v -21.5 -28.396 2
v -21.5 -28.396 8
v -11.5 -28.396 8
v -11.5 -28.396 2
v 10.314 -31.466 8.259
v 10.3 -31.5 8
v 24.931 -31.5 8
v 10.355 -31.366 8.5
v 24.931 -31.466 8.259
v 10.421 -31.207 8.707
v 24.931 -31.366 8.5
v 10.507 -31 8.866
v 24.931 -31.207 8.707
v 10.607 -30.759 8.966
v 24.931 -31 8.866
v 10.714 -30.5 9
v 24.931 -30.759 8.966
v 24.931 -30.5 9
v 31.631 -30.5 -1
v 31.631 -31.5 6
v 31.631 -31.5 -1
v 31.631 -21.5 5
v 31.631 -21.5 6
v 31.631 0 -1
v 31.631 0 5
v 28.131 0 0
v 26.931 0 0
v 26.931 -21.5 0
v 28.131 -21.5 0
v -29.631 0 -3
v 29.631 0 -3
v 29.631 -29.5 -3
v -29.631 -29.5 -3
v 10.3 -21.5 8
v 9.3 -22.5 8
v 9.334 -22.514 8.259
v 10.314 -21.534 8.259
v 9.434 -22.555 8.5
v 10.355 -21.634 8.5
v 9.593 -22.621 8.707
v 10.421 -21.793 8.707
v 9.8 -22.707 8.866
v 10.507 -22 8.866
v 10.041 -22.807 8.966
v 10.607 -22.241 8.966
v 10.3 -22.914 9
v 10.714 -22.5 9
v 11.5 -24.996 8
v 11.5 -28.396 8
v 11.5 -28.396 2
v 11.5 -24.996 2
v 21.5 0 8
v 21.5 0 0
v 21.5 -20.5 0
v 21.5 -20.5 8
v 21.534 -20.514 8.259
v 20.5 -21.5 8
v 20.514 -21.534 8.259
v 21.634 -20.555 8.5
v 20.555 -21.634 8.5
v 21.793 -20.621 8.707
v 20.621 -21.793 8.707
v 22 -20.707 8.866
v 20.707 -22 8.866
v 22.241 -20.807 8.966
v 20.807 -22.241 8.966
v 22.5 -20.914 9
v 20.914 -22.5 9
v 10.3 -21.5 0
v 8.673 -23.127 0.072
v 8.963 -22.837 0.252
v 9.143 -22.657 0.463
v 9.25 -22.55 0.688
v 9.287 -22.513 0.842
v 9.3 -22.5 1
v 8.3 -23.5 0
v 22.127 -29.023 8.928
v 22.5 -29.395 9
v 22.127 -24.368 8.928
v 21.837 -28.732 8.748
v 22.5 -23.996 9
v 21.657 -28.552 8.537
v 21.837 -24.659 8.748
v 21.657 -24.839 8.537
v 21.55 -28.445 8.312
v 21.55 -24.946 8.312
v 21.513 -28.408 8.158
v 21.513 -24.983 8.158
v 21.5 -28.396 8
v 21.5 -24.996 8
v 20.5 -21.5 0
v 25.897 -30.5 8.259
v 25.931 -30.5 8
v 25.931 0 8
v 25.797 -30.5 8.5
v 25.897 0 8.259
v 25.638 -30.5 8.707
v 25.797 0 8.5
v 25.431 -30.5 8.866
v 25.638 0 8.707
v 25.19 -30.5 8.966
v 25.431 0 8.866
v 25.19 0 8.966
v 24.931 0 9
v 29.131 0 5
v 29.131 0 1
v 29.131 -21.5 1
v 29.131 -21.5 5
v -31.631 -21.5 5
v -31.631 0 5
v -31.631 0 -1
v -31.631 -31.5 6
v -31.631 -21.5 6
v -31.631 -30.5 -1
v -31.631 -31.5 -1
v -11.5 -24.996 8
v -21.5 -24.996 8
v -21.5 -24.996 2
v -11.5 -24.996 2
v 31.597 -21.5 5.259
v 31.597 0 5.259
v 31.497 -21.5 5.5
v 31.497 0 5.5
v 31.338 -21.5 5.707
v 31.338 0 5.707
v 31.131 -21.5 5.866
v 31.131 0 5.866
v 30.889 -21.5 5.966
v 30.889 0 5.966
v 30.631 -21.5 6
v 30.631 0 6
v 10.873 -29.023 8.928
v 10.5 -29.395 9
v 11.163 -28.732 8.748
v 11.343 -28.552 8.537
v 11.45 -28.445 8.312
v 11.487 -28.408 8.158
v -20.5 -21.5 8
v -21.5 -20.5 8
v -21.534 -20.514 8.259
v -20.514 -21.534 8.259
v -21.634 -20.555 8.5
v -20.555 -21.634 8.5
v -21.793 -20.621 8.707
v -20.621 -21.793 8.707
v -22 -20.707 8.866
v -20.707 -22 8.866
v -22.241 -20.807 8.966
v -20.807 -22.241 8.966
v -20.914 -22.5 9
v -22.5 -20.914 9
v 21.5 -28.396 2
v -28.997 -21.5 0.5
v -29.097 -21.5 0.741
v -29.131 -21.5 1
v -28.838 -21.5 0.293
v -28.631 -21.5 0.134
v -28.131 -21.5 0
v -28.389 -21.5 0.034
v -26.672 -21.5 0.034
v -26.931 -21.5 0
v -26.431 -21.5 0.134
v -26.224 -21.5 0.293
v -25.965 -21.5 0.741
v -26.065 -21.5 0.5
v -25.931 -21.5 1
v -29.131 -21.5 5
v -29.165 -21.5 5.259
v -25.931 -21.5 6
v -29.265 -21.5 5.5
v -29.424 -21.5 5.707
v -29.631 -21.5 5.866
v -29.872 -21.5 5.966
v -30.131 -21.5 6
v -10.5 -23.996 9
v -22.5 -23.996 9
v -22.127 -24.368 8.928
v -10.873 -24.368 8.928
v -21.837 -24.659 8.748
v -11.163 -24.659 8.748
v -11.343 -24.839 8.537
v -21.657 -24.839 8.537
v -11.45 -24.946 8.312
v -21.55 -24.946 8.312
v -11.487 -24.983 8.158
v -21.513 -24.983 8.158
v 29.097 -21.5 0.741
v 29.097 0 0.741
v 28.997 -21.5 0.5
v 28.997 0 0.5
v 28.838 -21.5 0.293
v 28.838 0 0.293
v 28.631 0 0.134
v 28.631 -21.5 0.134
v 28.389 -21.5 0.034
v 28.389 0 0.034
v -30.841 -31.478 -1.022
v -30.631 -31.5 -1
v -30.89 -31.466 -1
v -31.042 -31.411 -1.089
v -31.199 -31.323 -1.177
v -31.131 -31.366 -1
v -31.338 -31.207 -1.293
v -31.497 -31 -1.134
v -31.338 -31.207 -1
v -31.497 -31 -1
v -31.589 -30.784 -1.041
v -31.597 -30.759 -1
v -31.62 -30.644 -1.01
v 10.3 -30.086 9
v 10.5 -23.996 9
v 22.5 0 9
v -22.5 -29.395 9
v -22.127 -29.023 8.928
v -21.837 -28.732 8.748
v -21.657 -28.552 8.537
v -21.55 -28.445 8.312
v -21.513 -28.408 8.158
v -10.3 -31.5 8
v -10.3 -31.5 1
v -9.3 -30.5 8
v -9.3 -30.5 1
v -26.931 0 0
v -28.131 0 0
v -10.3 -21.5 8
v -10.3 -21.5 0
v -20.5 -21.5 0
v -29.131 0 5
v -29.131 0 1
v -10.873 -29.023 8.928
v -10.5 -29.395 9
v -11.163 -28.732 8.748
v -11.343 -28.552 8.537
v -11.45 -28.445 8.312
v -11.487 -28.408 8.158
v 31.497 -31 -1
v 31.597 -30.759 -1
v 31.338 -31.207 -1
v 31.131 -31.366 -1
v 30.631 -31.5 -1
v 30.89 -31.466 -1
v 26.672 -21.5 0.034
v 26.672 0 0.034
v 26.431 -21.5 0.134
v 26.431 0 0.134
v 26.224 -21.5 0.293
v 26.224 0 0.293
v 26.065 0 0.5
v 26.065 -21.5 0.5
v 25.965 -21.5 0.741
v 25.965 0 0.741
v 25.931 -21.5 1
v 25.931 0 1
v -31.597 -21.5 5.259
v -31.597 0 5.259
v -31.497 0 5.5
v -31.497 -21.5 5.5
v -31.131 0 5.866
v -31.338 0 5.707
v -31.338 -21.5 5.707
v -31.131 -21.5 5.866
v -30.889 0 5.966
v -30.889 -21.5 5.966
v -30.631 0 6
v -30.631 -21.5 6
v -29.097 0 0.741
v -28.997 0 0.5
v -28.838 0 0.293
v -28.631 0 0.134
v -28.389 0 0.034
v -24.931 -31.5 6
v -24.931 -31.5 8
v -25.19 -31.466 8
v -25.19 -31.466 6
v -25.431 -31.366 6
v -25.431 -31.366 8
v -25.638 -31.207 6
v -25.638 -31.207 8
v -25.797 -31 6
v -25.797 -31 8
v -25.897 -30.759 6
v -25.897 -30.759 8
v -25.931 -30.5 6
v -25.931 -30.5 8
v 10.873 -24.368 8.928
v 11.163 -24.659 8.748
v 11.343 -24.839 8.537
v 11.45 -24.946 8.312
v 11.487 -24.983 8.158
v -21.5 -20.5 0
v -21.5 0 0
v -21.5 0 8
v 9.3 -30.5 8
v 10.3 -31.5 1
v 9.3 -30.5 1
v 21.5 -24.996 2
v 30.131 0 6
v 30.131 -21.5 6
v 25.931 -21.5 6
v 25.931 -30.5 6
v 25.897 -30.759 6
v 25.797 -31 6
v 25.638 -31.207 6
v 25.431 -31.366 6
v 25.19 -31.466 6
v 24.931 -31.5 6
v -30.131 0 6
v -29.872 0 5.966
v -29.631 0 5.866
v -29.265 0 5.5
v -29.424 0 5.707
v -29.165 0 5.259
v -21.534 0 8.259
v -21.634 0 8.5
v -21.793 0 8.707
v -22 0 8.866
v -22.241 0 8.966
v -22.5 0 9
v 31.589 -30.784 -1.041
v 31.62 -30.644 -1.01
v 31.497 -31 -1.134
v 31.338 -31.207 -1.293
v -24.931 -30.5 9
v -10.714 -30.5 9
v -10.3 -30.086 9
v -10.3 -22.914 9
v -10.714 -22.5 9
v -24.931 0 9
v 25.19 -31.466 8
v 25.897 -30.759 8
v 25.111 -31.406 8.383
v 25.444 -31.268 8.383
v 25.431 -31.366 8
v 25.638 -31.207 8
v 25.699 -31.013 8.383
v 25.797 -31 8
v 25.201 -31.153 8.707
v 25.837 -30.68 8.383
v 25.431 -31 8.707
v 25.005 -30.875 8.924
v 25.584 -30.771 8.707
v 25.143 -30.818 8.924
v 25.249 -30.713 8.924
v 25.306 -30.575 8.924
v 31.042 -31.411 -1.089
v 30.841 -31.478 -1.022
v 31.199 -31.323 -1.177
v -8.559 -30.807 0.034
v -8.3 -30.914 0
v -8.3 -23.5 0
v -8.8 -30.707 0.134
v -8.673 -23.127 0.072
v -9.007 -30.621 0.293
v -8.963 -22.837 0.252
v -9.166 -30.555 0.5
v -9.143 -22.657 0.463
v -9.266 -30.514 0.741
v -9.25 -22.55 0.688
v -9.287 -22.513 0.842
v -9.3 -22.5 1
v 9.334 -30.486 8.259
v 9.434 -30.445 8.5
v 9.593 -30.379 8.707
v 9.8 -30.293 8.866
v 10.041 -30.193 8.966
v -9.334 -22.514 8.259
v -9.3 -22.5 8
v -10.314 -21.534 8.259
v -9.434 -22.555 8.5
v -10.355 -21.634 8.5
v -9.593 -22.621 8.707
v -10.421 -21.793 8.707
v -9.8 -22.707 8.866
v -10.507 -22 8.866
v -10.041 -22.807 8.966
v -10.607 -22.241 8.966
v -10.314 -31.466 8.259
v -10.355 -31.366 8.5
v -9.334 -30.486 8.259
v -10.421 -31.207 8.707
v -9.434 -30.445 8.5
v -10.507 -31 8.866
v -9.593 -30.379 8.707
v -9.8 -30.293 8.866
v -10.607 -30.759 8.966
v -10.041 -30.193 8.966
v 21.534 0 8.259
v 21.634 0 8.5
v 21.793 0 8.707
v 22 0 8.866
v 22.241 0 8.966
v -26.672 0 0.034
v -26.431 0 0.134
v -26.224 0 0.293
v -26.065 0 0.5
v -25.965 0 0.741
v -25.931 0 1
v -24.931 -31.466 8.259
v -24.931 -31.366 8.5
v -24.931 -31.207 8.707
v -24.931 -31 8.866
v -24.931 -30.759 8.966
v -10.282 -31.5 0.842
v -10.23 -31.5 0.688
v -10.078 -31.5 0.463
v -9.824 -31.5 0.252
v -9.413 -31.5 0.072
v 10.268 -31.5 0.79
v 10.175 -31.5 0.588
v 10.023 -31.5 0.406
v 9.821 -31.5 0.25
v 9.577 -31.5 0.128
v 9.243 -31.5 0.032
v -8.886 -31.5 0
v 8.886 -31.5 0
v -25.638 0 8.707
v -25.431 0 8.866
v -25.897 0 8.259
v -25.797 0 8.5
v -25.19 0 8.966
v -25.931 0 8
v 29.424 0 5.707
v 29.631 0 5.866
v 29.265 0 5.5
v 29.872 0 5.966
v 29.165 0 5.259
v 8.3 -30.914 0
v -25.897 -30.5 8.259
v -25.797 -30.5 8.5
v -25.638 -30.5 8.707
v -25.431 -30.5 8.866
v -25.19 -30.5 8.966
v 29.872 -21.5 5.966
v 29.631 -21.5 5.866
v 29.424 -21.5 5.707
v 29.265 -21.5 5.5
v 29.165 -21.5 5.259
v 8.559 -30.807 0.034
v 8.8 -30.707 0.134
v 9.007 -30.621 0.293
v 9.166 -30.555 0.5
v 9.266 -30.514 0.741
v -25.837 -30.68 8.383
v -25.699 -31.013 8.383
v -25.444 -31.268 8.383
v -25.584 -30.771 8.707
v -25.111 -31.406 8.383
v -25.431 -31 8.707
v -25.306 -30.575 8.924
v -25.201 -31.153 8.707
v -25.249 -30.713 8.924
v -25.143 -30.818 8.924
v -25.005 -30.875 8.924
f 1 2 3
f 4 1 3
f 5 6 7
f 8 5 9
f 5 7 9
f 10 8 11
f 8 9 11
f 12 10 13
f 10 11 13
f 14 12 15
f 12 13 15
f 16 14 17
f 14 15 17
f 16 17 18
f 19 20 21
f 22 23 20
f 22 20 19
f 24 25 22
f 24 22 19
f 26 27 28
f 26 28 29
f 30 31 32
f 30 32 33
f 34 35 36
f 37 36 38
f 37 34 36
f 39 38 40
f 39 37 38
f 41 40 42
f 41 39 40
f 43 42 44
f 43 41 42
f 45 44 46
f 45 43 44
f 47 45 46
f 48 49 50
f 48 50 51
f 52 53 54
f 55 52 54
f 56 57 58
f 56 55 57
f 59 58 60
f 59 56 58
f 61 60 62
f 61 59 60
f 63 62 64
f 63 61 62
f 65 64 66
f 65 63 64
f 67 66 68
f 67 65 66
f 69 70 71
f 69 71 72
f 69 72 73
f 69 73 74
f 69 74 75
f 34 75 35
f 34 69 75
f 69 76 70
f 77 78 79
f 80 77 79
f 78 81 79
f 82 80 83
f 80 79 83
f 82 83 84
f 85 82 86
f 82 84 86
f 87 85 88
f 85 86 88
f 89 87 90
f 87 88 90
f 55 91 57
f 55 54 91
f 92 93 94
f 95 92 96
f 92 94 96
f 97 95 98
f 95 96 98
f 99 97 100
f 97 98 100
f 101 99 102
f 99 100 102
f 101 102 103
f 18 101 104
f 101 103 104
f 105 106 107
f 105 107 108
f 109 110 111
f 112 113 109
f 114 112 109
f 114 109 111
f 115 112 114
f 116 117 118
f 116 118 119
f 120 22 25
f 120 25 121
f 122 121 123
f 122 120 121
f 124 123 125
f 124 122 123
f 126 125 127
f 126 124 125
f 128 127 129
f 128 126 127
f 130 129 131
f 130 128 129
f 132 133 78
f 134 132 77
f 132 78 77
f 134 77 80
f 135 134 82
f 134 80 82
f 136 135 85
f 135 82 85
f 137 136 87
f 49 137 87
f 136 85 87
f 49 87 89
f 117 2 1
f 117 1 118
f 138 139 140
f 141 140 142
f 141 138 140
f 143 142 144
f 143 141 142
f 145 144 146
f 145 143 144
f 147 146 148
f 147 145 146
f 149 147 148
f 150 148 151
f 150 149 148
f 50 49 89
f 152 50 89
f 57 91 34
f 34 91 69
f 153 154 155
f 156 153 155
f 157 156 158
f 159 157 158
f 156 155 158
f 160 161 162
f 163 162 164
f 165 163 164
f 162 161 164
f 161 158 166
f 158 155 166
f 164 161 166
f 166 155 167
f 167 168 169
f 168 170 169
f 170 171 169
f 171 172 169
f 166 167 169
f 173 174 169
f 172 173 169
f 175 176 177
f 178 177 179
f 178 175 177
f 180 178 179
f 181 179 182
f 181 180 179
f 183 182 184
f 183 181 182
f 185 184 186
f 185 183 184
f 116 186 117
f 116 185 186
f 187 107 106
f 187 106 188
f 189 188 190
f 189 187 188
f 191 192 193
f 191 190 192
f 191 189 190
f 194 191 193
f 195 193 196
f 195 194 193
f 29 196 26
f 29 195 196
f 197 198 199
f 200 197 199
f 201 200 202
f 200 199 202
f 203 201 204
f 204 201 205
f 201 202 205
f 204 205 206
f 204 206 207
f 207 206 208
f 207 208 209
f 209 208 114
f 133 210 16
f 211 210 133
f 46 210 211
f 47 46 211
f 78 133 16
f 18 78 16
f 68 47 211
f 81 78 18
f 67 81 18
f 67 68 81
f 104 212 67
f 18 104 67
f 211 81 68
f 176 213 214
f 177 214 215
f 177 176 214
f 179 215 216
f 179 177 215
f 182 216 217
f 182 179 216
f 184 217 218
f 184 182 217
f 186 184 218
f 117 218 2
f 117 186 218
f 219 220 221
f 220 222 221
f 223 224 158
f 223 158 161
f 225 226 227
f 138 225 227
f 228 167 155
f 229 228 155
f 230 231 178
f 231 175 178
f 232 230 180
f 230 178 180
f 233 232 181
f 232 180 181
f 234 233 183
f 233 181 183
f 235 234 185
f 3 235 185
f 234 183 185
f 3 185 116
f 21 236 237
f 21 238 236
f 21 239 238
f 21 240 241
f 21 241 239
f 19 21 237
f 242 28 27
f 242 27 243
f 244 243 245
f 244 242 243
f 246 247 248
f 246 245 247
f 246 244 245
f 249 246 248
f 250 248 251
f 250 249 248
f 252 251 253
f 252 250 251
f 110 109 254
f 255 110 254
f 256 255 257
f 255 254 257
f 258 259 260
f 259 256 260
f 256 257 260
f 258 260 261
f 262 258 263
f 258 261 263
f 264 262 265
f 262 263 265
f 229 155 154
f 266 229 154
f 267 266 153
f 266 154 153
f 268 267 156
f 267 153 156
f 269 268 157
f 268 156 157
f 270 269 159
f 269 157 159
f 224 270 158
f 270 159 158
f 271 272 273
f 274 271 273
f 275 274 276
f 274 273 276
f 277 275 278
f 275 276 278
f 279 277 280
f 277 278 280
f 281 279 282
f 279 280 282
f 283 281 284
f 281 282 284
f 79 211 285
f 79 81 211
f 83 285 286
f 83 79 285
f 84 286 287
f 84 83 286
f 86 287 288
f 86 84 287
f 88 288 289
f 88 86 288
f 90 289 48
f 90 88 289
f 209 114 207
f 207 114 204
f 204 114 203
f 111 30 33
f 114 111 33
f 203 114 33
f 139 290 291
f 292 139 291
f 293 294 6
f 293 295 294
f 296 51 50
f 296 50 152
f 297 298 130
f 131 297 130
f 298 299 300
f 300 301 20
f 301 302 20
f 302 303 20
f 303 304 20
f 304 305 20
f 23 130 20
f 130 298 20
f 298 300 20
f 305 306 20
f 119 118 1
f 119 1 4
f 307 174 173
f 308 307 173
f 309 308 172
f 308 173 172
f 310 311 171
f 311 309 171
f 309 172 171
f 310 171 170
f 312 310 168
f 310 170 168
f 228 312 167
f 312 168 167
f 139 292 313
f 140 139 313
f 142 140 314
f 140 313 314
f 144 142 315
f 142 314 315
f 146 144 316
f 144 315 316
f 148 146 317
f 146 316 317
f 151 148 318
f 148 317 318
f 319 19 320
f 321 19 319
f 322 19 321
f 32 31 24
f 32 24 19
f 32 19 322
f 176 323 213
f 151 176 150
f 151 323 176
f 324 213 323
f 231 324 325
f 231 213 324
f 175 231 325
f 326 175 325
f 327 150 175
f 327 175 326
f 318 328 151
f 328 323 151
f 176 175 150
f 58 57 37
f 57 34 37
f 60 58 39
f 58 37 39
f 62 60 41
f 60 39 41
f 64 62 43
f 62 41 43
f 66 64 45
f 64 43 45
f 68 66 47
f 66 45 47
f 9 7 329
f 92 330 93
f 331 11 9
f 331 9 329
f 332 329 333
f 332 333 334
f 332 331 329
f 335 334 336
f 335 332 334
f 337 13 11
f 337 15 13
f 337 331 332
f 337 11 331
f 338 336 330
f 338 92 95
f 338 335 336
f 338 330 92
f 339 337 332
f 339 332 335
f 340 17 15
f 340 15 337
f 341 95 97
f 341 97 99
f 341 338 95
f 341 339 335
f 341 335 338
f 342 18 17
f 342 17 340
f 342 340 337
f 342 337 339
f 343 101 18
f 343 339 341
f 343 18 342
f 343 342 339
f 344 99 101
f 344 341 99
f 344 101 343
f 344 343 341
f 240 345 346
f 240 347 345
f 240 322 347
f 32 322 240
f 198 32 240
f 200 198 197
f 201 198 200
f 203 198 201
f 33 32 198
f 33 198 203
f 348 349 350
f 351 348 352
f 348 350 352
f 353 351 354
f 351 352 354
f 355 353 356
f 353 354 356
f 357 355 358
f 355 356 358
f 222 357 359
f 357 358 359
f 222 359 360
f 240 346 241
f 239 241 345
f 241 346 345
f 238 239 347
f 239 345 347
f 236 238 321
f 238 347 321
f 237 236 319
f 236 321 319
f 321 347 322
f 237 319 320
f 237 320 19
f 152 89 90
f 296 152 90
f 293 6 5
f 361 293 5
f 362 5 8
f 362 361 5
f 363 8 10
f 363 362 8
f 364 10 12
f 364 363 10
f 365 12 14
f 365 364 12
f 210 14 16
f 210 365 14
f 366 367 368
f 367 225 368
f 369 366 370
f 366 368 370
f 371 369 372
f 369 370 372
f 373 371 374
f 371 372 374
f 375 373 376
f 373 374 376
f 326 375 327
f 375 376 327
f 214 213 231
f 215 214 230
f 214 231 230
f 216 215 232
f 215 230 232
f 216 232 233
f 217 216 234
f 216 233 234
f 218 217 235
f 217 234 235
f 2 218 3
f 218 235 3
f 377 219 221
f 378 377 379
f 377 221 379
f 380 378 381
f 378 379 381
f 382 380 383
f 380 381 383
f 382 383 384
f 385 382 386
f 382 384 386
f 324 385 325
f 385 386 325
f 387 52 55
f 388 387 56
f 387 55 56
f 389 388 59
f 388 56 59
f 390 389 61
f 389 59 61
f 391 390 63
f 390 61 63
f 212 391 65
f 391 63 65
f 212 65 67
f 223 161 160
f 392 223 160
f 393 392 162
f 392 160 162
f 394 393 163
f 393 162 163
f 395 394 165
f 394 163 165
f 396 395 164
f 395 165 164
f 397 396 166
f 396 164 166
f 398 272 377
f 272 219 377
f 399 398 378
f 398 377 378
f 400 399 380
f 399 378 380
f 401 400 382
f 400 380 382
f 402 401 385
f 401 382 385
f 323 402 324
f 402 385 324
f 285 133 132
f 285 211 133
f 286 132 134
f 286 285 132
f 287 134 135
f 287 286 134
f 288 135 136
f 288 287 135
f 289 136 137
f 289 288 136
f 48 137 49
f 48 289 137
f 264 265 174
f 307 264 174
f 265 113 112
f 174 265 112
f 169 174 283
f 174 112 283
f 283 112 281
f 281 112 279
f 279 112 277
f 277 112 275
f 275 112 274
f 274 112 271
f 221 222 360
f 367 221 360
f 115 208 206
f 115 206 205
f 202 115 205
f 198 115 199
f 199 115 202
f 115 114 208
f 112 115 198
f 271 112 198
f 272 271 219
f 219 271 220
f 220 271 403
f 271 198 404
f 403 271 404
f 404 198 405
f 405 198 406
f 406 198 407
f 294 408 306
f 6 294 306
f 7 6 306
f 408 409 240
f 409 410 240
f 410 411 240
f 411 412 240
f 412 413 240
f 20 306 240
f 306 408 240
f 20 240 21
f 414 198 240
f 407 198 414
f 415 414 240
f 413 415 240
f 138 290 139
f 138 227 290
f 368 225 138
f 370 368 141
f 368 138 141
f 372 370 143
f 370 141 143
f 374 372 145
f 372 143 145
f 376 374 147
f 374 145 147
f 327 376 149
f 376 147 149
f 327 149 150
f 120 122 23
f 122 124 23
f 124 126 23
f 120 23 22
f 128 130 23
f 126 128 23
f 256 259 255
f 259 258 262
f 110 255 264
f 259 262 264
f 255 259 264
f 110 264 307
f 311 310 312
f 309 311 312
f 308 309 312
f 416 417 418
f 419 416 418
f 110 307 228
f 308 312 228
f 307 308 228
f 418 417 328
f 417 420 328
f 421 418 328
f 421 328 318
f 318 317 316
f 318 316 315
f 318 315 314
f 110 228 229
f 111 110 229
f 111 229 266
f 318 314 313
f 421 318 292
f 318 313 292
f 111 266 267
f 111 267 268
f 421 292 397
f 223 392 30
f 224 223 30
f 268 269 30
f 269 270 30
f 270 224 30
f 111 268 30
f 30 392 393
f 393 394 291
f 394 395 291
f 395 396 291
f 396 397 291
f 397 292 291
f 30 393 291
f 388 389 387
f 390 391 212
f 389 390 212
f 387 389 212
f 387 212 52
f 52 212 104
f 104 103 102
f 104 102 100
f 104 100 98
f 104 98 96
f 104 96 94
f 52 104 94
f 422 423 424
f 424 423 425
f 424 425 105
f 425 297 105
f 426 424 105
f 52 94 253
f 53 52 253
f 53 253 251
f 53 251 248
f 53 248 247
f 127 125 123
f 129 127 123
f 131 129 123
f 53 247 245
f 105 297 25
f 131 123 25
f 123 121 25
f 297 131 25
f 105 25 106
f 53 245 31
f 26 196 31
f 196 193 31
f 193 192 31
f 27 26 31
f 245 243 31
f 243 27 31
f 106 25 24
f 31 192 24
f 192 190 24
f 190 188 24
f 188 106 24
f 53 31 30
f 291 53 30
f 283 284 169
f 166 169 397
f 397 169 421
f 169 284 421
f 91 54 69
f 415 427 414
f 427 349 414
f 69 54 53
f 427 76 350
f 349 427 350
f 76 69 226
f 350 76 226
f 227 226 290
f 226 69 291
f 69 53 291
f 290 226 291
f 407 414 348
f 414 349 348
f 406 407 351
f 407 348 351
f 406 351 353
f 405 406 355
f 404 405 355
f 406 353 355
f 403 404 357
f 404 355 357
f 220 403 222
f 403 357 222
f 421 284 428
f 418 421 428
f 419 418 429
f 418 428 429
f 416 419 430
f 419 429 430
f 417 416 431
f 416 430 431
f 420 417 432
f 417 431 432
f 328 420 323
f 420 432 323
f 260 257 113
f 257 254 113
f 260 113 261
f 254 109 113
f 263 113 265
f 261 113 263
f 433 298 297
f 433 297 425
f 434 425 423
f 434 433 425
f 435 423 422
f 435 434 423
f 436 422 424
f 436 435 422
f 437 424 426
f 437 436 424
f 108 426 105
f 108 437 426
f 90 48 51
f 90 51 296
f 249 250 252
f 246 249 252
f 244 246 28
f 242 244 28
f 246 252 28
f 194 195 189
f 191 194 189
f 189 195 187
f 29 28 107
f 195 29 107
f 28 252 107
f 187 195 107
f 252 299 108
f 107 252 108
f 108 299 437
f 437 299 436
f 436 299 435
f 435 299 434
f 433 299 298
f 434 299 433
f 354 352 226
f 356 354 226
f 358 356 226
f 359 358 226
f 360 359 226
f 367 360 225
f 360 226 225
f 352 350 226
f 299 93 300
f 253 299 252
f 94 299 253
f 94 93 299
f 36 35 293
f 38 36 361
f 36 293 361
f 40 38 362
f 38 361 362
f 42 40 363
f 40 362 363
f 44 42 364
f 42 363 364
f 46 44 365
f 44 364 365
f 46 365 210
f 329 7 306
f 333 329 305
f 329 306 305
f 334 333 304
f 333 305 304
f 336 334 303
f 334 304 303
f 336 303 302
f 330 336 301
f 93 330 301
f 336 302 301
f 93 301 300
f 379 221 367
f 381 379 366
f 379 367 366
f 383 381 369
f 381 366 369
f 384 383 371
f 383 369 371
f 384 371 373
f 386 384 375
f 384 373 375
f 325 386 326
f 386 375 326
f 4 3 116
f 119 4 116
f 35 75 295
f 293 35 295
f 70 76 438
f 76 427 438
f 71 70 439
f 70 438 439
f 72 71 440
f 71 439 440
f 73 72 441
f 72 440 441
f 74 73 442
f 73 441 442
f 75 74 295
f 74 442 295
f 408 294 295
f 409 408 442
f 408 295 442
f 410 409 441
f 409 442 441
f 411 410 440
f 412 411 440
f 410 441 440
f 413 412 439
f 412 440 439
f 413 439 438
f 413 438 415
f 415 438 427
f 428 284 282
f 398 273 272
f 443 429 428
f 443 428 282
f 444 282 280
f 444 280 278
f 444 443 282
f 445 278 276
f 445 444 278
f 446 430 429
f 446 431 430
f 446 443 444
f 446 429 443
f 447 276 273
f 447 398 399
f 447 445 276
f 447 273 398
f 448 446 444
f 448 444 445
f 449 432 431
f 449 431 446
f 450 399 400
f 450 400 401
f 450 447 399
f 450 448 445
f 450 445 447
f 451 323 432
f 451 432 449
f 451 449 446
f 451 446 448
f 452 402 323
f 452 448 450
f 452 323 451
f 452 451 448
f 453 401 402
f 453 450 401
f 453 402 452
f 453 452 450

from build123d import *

# Parameters (mm, degrees)
BOSS_EXTRU_2_DEPTH      = 9
ESQUISSE3_W             = 51.8612703
ESQUISSE3_H             = 63
BOSS_EXTRU_3_DEPTH      = 3
ESQUISSE4_W             = 10
ESQUISSE4_H             = 3.4
ENL_V_MAT_EXTRU_1_DEPTH = 7
ESQUISSE5_W             = 3.2
ESQUISSE5_H             = 3
BOSS_EXTRU_4_DEPTH      = 63
CHANFREIN1_SIZE         = 1
CHANFREIN2_SIZE         = 2
CONG_1_R                = 1
CONG_2_R                = 1
CHANFREIN4_SIZE         = 1
CONG_4_R                = 1
CONG_5_R                = 1
ESQUISSE6_W             = 6.7
ESQUISSE6_H             = 1
BOSS_EXTRU_5_DEPTH      = 10
ESQUISSE7_W             = 25.281431527
ESQUISSE7_H             = 35.175981147
ENL_V_MAT_EXTRU_2_DEPTH = 79


with BuildPart() as part:
    # Esquisse2 → Boss.-Extru.2 (new body)
    with BuildSketch(Plane.XY):
        Polygon((-9.3, -31.5), (-9.3, -21.5), (-21.5, -21.5), (-21.5, 21.5), (21.5, 21.5), (21.5, -21.5), (9.3, -21.5), (9.3, -31.5), (25.93063515, -31.5), (25.93063515, 31.5), (-25.93063515, 31.5), (-25.93063515, -31.5), align=None)
    extrude(amount=BOSS_EXTRU_2_DEPTH)

    # Esquisse3 → Boss.-Extru.3 (add)
    with BuildSketch(Plane(origin=(0, 0, 0), x_dir=(-1, 0, 0), z_dir=(0, 0, -1))):
        Rectangle(ESQUISSE3_W, ESQUISSE3_H)
    extrude(amount=BOSS_EXTRU_3_DEPTH)

    # Esquisse4 → Enlèv. mat.-Extru.1 (cut)
    with BuildSketch(Plane.XY.offset(9)):
        with Locations((-16.5, -26.695538472)):
            Rectangle(ESQUISSE4_W, ESQUISSE4_H)
        with Locations((16.5, -26.695538472)):
            Rectangle(ESQUISSE4_W, ESQUISSE4_H)
        with Locations((16.5, 26.695538472)):
            Rectangle(ESQUISSE4_W, ESQUISSE4_H)
        with Locations((-16.5, 26.695538472)):
            Rectangle(ESQUISSE4_W, ESQUISSE4_H)
    extrude(amount=-ENL_V_MAT_EXTRU_1_DEPTH, mode=Mode.SUBTRACT)

    # Esquisse5 → Boss.-Extru.4 (add)
    with BuildSketch(Plane(origin=(0, 31.5, 0), x_dir=(1, 0, 0), z_dir=(0, 1, 0))):
        Polygon((-29.13063515, 0), (-29.13063515, 3), (-31.63063515, 3), (-31.63063515, -6), (-29.13063515, -6), align=None)
        with Locations((-27.53063515, 1.5)):
            Rectangle(ESQUISSE5_W, ESQUISSE5_H)
        with Locations((27.53063515, 1.5)):
            Rectangle(ESQUISSE5_W, ESQUISSE5_H)
        Polygon((29.13063515, 3), (29.13063515, 0), (29.13063515, -6), (31.63063515, -6), (31.63063515, 3), align=None)
    extrude(amount=-BOSS_EXTRU_4_DEPTH)

    # Chanfrein1
    chanfrein1_edges = [part.edges().sort_by_distance(p)[0] for p in [
        (21.5, -21.5, 4.5),
        (21.5, 21.5, 4.5),
        (-21.5, 21.5, 4.5),
        (-21.5, -21.5, 4.5),
    ]]
    chamfer(chanfrein1_edges, length=CHANFREIN1_SIZE)

    # Chanfrein2
    chanfrein2_edges = [part.edges().sort_by_distance(p)[0] for p in [
        (-31.63063515, 0, -3),
        (31.63063515, 0, -3),
        (0, -31.5, -3),
        (0, 31.5, -3),
    ]]
    chamfer(chanfrein2_edges, length=CHANFREIN2_SIZE)

    # Congé1
    cong_1_edges = [part.edges().sort_by_distance(p)[0] for p in [
        (-25.93063515, 0, 0),
        (-29.13063515, 0, 0),
        (-29.13063515, 0, 6),
        (-31.63063515, 0, 6),
        (25.93063515, 0, 0),
        (29.13063515, 0, 0),
        (29.13063515, 0, 6),
        (31.63063515, 0, 6),
    ]]
    fillet(cong_1_edges, radius=CONG_1_R)

    # Congé2
    cong_2_edges = [part.edges().sort_by_distance(p)[0] for p in [
        (-31.63063515, 31.5, 2),
        (31.63063515, 31.5, 2),
        (30.38063515, -31.5, 6),
        (30.38063515, 31.5, 6),
        (-30.38063515, 31.5, 6),
        (-29.13063515, 31.5, 3),
        (-27.53063515, 31.5, 0),
        (27.53063515, 31.5, 0),
        (29.13063515, 31.5, 3),
        (-31.337741931, 31.5, 5.707106781),
        (-29.423528369, 31.5, 5.707106781),
        (29.423528369, 31.5, 5.707106781),
        (31.337741931, 31.5, 5.707106781),
        (31.63063515, -31.5, 2),
        (-31.63063515, -31.5, 2),
        (29.13063515, -31.5, 3),
        (27.53063515, -31.5, 0),
        (-27.53063515, -31.5, 0),
        (-29.13063515, -31.5, 3),
        (-30.38063515, -31.5, 6),
        (-31.337741931, -31.5, 5.707106781),
        (-29.423528369, -31.5, 5.707106781),
        (29.423528369, -31.5, 5.707106781),
        (31.337741931, -31.5, 5.707106781),
        (28.837741931, 31.5, 0.292893219),
        (28.837741931, -31.5, 0.292893219),
        (26.223528369, 31.5, 0.292893219),
        (26.223528369, -31.5, 0.292893219),
        (-28.837741931, 31.5, 0.292893219),
        (-28.837741931, -31.5, 0.292893219),
        (-26.223528369, 31.5, 0.292893219),
        (-26.223528369, -31.5, 0.292893219),
        (-25.93063515, -31.5, 5),
        (-25.93063515, 31.5, 5),
        (25.93063515, 31.5, 5),
        (25.93063515, -31.5, 5),
    ]]
    fillet(cong_2_edges, radius=CONG_2_R - 0.0001)  # a hair under: the kernel refuses the full size

    # Chanfrein4
    chanfrein4_edges = [part.edges().sort_by_distance(p)[0] for p in [
        (-9.3, -31.5, 4.5),
        (9.3, -31.5, 4.5),
        (9.3, -21.5, 4.5),
        (-9.3, -21.5, 4.5),
    ]]
    chamfer(chanfrein4_edges, length=CHANFREIN4_SIZE)

    # Congé4
    cong_4_edges = [part.edges().sort_by_distance(p)[0] for p in [
        (-21.5, 0, 9),
        (-15.4, -21.5, 9),
        (21.5, 0, 9),
        (0, 21.5, 9),
        (-21, -21, 9),
        (21, -21, 9),
        (21, 21, 9),
        (-21, 21, 9),
        (0, 31.5, 9),
        (-17.615367575, -31.5, 9),
        (-25.93063515, 0, 9),
        (25.93063515, 0, 9),
        (25.63777122, 31.207136071, 9),
        (25.63777122, -31.207136071, 9),
        (-25.63777122, -31.207136071, 9),
        (-25.63777122, 31.207136071, 9),
        (17.615367575, -31.5, 9),
        (9.3, -26.5, 9),
        (-9.3, -26.5, 9),
        (15.4, -21.5, 9),
        (-9.8, -22, 9),
        (9.8, -22, 9),
        (-9.8, -31, 9),
        (9.8, -31, 9),
        (-16.5, 28.395538472, 9),
        (-11.5, 26.695538472, 9),
        (-21.5, 26.695538472, 9),
        (-16.5, 24.995538472, 9),
        (21.5, 26.695538472, 9),
        (16.5, 24.995538472, 9),
        (16.5, 28.395538472, 9),
        (11.5, 26.695538472, 9),
        (16.5, -28.395538472, 9),
        (11.5, -26.695538472, 9),
        (21.5, -26.695538472, 9),
        (16.5, -24.995538472, 9),
        (-21.5, -26.695538472, 9),
        (-16.5, -24.995538472, 9),
        (-16.5, -28.395538472, 9),
        (-11.5, -26.695538472, 9),
    ]]
    fillet(cong_4_edges, radius=CONG_4_R - 0.0001)  # a hair under: the kernel refuses the full size

    # Congé5
    cong_5_edges = [part.edges().sort_by_distance(p)[0] for p in [
        (9.3, -26.5, 0),
        (-9.3, -26.5, 0),
        (9.8, -31, 0),
        (-9.8, -31, 0),
    ]]
    fillet(cong_5_edges, radius=CONG_5_R)

    # Esquisse6 → Boss.-Extru.5 (add)
    with BuildSketch(Plane.XZ.offset(31.5)):
        with BuildLine():
            Line((-24.93063515, 1), (-24.93063515, 5))
            Line((-24.93063515, 5), (-31.63063515, 5))
            Line((-31.63063515, 5), (-31.63063515, -1))
            Line((-31.63063515, -1), (-26.93063515, -1))
            ThreePointArc((-26.93063515, -1), (-25.516421587, -0.414213562), (-24.93063515, 1))
        make_face()
        with Locations((-28.28063515, 5.5)):
            Rectangle(ESQUISSE6_W, ESQUISSE6_H)
        with BuildLine():
            Line((31.63063515, -1), (31.63063515, 5))
            Line((31.63063515, 5), (24.93063515, 5))
            Line((24.93063515, 5), (24.93063515, 1))
            ThreePointArc((24.93063515, 1), (25.516421587, -0.414213562), (26.93063515, -1))
            Line((26.93063515, -1), (31.63063515, -1))
        make_face()
        with Locations((28.28063515, 5.5)):
            Rectangle(ESQUISSE6_W, ESQUISSE6_H)
    extrude(amount=-BOSS_EXTRU_5_DEPTH)

    # Esquisse7 → Enlèv. mat.-Extru.2 (cut)
    with BuildSketch(Plane(origin=(31.63063515, 0, 0), x_dir=(0, 0, -1), z_dir=(1, 0, 0))):
        with Locations((3.640715764, 17.587990574)):
            Rectangle(ESQUISSE7_W, ESQUISSE7_H)
    extrude(amount=-ENL_V_MAT_EXTRU_2_DEPTH, mode=Mode.SUBTRACT)


solid = part.part
